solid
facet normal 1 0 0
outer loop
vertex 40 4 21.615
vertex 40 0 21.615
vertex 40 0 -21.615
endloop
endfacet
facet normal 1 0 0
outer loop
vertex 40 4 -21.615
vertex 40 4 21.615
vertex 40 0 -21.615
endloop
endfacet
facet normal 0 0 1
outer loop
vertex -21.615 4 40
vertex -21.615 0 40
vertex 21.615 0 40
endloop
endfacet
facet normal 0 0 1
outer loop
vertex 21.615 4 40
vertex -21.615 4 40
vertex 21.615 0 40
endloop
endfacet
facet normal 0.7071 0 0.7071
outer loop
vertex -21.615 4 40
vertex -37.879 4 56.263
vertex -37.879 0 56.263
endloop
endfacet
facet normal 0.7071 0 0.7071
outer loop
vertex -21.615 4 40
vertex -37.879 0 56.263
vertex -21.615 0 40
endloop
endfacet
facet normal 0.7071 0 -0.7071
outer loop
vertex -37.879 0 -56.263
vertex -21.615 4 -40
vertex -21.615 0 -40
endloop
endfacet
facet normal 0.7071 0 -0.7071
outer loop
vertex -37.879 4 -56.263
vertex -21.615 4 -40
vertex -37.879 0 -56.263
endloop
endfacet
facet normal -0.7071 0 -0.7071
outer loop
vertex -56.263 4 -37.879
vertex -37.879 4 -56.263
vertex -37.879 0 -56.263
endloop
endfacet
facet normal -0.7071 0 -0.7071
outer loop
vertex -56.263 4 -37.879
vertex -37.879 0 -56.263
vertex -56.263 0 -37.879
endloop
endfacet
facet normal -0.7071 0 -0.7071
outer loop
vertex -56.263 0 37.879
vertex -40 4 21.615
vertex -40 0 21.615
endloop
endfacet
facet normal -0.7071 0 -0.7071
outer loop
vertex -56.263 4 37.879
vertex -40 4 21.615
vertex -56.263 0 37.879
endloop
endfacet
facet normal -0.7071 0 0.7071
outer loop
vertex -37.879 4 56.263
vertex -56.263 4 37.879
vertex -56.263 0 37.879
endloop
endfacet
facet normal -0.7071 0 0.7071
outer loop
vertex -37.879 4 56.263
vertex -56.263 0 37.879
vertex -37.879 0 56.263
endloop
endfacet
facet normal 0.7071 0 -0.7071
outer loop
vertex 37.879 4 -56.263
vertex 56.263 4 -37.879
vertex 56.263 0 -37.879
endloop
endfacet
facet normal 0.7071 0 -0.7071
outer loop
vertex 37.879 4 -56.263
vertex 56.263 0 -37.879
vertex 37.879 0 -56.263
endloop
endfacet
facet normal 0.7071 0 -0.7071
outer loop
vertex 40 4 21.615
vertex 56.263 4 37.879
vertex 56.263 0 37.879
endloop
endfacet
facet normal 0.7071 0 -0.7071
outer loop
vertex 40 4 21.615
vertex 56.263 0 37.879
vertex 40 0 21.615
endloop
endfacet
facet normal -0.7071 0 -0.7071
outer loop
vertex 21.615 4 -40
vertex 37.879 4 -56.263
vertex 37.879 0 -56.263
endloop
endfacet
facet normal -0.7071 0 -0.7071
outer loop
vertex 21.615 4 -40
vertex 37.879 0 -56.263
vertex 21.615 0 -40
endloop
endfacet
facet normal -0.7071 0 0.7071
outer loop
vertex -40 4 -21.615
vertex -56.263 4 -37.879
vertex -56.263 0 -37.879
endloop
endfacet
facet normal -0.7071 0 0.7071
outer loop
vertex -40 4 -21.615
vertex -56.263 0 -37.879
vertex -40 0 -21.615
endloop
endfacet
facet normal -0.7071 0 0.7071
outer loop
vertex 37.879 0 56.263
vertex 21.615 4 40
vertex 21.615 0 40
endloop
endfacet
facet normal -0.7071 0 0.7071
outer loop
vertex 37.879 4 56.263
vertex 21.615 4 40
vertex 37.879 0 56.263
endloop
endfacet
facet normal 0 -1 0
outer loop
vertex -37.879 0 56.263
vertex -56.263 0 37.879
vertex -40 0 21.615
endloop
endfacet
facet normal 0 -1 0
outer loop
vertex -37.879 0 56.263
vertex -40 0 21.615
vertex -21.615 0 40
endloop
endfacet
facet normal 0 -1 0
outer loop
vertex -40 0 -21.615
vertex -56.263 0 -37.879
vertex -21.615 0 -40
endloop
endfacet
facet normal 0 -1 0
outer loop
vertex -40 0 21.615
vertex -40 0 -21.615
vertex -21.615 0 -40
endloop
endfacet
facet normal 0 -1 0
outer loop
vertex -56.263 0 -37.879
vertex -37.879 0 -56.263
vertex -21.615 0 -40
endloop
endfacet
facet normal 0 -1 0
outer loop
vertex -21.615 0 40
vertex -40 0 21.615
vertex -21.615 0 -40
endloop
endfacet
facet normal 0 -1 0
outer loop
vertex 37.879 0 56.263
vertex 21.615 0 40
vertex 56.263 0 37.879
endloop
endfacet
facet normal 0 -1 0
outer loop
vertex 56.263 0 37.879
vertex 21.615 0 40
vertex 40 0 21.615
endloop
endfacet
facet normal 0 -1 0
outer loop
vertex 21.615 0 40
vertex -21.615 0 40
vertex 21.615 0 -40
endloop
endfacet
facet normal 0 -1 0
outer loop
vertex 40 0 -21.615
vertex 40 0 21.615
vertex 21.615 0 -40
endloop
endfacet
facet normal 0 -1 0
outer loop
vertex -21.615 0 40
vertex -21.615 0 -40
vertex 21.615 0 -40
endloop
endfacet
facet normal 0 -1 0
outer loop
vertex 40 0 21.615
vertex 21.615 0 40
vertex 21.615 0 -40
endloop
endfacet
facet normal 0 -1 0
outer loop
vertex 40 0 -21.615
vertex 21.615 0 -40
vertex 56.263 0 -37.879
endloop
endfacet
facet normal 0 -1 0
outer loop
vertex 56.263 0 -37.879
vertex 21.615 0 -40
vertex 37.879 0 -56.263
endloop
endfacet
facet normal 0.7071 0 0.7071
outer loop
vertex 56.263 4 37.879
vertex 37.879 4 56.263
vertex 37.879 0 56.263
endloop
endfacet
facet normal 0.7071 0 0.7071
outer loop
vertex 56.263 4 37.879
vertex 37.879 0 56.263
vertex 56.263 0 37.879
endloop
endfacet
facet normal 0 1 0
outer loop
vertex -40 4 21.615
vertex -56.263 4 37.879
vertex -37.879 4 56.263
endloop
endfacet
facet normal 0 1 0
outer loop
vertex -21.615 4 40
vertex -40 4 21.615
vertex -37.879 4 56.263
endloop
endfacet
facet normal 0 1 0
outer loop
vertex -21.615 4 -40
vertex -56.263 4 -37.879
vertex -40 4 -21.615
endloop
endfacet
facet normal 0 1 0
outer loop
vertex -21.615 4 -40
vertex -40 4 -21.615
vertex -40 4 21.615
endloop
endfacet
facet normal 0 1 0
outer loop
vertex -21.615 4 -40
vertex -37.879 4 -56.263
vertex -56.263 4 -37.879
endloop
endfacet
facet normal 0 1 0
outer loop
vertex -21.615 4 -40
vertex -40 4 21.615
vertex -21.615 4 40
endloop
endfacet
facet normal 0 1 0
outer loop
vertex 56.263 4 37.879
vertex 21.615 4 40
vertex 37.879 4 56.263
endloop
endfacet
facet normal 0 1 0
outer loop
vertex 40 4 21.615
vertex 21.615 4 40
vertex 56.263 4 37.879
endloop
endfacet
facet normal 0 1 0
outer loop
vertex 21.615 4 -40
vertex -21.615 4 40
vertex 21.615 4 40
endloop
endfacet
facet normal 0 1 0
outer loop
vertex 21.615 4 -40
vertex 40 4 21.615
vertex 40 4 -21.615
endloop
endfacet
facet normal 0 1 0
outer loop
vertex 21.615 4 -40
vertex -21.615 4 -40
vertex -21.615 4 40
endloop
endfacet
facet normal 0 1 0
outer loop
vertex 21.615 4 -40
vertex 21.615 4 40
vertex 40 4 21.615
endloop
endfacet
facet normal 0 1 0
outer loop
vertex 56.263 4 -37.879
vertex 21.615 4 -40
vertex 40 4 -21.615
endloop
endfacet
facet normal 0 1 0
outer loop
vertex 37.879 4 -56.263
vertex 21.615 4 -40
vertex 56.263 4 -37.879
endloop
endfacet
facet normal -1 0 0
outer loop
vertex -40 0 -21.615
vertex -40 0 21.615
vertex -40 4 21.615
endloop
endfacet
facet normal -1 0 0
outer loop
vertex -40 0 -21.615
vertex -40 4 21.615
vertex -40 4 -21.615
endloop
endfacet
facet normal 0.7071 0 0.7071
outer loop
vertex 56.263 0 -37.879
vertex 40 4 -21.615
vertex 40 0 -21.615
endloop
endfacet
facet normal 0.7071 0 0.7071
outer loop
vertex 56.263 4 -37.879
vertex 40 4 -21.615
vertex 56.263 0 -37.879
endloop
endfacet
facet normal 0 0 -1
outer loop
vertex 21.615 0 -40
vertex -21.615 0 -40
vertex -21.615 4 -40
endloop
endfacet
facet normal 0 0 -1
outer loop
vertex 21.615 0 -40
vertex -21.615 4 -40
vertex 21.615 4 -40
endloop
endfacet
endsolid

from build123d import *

# Parameters (mm, degrees)
SKETCH1_W           = 80
SKETCH1_H           = 80
BOSS_EXTRUDE1_DEPTH = 4
BOSS_EXTRUDE2_DEPTH = 4


with BuildPart() as part:
    # Sketch1 → Boss-Extrude1 (new body)
    with BuildSketch(Plane(origin=(0, 0, 0), x_dir=(1, 0, 0), z_dir=(0, 1, 0))):
        Rectangle(SKETCH1_W, SKETCH1_H)
    extrude(amount=BOSS_EXTRUDE1_DEPTH)

    # Sketch2 → Boss-Extrude2 (add)
    with BuildSketch(Plane(origin=(0, 4, 0), x_dir=(1, 0, 0), z_dir=(0, 1, 0))):
        Polygon((-56.263455967, 37.878679656), (-40, 21.615223689), (-40, 40), (-21.615223689, 40), (-37.878679656, 56.263455967), align=None)
        Polygon((-37.878679656, -56.263455967), (-21.615223689, -40), (-40, -40), (-40, -21.615223689), (-56.263455967, -37.878679656), align=None)
        Polygon((40, 40), (40, 21.615223689), (56.263455967, 37.878679656), (37.878679656, 56.263455967), (21.615223689, 40), align=None)
        Polygon((21.615223689, -40), (37.878679656, -56.263455967), (56.263455967, -37.878679656), (40, -21.615223689), (40, -40), align=None)
    extrude(amount=-BOSS_EXTRUDE2_DEPTH)


solid = part.part
